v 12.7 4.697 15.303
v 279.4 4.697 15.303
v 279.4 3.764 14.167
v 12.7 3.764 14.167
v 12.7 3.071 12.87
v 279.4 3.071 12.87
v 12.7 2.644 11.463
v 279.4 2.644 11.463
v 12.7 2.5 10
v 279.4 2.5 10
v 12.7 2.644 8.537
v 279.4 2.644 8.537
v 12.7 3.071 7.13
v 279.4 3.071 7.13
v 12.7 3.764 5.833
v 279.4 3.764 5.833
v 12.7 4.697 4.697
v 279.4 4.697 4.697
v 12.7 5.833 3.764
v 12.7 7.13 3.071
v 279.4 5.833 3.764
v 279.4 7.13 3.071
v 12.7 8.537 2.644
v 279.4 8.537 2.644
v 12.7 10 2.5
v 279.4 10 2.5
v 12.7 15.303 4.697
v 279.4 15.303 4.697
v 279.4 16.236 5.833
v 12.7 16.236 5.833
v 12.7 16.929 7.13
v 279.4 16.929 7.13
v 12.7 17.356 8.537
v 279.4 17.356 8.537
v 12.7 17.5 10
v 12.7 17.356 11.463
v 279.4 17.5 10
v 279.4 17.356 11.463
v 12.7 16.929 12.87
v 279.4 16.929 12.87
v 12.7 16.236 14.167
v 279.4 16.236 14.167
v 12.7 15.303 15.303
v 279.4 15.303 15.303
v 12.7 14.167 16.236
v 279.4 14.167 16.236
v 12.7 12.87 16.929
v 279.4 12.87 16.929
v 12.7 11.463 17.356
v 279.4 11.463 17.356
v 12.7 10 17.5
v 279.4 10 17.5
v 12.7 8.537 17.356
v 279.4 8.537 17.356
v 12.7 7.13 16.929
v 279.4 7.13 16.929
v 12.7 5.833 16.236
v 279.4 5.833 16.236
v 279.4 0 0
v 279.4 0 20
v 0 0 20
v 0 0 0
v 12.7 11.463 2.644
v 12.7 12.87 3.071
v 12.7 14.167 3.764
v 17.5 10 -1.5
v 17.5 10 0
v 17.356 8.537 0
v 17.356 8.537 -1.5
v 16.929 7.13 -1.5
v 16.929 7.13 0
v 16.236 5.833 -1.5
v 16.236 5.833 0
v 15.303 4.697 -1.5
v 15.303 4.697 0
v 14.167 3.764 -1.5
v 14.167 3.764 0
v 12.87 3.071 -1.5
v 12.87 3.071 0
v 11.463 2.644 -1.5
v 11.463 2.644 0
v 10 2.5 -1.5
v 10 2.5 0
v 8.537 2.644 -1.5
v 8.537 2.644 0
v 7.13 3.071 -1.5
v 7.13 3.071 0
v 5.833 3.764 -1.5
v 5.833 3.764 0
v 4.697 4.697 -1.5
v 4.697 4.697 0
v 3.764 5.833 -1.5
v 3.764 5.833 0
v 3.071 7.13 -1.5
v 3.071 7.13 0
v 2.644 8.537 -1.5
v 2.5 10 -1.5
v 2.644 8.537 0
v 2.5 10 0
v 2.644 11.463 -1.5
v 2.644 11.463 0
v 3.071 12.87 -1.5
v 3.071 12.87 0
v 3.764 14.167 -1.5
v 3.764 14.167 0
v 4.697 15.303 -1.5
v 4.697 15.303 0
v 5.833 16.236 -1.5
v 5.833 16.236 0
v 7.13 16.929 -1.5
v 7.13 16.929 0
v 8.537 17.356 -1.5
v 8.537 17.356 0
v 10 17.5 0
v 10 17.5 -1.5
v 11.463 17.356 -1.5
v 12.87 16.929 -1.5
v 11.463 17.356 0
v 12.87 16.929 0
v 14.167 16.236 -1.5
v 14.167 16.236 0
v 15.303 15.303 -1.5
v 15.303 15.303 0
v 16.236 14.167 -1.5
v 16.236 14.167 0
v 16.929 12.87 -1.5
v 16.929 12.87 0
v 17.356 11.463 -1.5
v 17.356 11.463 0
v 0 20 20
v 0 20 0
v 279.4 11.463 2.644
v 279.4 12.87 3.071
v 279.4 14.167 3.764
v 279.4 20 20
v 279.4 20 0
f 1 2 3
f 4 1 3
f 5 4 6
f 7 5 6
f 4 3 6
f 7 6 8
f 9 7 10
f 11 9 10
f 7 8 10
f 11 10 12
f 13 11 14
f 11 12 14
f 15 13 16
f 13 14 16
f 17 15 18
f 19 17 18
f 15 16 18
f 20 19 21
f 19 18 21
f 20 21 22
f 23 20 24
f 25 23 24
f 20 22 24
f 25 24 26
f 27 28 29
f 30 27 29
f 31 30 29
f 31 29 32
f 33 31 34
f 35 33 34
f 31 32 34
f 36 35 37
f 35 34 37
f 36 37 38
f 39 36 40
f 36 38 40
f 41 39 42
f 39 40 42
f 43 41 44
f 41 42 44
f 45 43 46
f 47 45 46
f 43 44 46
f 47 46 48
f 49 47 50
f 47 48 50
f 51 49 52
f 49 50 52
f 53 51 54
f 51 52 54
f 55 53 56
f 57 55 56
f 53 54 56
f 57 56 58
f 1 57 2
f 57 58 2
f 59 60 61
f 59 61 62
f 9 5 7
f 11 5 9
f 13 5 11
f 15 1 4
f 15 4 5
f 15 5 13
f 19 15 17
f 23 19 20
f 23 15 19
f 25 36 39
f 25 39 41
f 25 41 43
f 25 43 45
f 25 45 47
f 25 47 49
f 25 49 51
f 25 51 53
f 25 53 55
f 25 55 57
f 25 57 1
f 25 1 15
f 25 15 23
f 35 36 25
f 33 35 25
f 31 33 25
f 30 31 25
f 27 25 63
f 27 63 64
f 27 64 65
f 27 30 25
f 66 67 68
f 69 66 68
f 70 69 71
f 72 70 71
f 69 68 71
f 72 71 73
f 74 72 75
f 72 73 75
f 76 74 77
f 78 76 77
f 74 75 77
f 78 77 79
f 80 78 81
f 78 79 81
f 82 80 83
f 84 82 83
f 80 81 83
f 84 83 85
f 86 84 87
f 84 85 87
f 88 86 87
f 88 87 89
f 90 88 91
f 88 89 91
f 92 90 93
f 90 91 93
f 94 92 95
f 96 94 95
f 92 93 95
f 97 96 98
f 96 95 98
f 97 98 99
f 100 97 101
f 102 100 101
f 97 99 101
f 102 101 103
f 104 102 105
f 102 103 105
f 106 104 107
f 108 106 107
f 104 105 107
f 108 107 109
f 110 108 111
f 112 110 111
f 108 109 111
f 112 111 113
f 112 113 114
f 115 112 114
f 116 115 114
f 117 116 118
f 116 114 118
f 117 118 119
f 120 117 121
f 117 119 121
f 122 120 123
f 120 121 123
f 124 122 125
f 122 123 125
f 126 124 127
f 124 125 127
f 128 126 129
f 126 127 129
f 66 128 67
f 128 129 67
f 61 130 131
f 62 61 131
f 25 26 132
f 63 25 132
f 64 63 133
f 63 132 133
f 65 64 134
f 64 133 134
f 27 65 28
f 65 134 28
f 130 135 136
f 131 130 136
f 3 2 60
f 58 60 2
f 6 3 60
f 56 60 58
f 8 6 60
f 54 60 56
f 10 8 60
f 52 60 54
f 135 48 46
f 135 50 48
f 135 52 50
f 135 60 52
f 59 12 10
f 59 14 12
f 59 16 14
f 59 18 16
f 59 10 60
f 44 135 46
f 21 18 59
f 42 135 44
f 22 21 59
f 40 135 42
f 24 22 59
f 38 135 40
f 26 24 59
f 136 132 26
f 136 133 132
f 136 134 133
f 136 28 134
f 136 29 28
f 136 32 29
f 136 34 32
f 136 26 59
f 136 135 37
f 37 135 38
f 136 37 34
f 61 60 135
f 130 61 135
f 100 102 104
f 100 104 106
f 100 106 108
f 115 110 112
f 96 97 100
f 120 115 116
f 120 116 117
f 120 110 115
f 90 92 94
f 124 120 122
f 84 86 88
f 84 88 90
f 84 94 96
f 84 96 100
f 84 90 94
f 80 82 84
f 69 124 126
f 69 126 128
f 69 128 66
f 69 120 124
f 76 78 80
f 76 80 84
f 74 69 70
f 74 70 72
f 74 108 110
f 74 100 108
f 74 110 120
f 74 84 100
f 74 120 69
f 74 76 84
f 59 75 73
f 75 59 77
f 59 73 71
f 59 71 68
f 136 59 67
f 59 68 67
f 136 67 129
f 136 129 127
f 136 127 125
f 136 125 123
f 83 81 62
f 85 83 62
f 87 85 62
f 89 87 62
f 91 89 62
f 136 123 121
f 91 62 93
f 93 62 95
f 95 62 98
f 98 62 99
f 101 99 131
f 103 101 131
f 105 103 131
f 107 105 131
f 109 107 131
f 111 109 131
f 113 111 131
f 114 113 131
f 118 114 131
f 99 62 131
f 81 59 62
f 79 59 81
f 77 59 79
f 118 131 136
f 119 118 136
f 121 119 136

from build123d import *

# Parameters (mm, degrees)
SKETCH1_W           = 20
SKETCH1_H           = 20
BOSS_EXTRUDE1_DEPTH = 279.4
SKETCH3_R           = 7.5
BOSS_EXTRUDE2_DEPTH = 1.5
SKETCH2_R           = 7.5
CUT_EXTRUDE1_DEPTH  = 266.7


with BuildPart() as part:
    # Sketch1 → Boss-Extrude1 (new body)
    with BuildSketch(Plane(origin=(0, 0, 0), x_dir=(0, 0, -1), z_dir=(1, 0, 0))):
        with Locations((-10, 10)):
            Rectangle(SKETCH1_W, SKETCH1_H)
    extrude(amount=BOSS_EXTRUDE1_DEPTH)

    # Sketch3 → Boss-Extrude2 (add)
    with BuildSketch(Plane(origin=(0, 0, 0), x_dir=(-1, 0, 0), z_dir=(0, 0, -1))):
        with Locations((-10, 10)):
            Circle(SKETCH3_R)
    extrude(amount=BOSS_EXTRUDE2_DEPTH)

    # Sketch2 → Cut-Extrude1 (cut)
    with BuildSketch(Plane(origin=(279.4, 0, 0), x_dir=(0, 0, -1), z_dir=(1, 0, 0))):
        with Locations((-10, 10)):
            Circle(SKETCH2_R)
    extrude(amount=-CUT_EXTRUDE1_DEPTH, mode=Mode.SUBTRACT)


solid = part.part
